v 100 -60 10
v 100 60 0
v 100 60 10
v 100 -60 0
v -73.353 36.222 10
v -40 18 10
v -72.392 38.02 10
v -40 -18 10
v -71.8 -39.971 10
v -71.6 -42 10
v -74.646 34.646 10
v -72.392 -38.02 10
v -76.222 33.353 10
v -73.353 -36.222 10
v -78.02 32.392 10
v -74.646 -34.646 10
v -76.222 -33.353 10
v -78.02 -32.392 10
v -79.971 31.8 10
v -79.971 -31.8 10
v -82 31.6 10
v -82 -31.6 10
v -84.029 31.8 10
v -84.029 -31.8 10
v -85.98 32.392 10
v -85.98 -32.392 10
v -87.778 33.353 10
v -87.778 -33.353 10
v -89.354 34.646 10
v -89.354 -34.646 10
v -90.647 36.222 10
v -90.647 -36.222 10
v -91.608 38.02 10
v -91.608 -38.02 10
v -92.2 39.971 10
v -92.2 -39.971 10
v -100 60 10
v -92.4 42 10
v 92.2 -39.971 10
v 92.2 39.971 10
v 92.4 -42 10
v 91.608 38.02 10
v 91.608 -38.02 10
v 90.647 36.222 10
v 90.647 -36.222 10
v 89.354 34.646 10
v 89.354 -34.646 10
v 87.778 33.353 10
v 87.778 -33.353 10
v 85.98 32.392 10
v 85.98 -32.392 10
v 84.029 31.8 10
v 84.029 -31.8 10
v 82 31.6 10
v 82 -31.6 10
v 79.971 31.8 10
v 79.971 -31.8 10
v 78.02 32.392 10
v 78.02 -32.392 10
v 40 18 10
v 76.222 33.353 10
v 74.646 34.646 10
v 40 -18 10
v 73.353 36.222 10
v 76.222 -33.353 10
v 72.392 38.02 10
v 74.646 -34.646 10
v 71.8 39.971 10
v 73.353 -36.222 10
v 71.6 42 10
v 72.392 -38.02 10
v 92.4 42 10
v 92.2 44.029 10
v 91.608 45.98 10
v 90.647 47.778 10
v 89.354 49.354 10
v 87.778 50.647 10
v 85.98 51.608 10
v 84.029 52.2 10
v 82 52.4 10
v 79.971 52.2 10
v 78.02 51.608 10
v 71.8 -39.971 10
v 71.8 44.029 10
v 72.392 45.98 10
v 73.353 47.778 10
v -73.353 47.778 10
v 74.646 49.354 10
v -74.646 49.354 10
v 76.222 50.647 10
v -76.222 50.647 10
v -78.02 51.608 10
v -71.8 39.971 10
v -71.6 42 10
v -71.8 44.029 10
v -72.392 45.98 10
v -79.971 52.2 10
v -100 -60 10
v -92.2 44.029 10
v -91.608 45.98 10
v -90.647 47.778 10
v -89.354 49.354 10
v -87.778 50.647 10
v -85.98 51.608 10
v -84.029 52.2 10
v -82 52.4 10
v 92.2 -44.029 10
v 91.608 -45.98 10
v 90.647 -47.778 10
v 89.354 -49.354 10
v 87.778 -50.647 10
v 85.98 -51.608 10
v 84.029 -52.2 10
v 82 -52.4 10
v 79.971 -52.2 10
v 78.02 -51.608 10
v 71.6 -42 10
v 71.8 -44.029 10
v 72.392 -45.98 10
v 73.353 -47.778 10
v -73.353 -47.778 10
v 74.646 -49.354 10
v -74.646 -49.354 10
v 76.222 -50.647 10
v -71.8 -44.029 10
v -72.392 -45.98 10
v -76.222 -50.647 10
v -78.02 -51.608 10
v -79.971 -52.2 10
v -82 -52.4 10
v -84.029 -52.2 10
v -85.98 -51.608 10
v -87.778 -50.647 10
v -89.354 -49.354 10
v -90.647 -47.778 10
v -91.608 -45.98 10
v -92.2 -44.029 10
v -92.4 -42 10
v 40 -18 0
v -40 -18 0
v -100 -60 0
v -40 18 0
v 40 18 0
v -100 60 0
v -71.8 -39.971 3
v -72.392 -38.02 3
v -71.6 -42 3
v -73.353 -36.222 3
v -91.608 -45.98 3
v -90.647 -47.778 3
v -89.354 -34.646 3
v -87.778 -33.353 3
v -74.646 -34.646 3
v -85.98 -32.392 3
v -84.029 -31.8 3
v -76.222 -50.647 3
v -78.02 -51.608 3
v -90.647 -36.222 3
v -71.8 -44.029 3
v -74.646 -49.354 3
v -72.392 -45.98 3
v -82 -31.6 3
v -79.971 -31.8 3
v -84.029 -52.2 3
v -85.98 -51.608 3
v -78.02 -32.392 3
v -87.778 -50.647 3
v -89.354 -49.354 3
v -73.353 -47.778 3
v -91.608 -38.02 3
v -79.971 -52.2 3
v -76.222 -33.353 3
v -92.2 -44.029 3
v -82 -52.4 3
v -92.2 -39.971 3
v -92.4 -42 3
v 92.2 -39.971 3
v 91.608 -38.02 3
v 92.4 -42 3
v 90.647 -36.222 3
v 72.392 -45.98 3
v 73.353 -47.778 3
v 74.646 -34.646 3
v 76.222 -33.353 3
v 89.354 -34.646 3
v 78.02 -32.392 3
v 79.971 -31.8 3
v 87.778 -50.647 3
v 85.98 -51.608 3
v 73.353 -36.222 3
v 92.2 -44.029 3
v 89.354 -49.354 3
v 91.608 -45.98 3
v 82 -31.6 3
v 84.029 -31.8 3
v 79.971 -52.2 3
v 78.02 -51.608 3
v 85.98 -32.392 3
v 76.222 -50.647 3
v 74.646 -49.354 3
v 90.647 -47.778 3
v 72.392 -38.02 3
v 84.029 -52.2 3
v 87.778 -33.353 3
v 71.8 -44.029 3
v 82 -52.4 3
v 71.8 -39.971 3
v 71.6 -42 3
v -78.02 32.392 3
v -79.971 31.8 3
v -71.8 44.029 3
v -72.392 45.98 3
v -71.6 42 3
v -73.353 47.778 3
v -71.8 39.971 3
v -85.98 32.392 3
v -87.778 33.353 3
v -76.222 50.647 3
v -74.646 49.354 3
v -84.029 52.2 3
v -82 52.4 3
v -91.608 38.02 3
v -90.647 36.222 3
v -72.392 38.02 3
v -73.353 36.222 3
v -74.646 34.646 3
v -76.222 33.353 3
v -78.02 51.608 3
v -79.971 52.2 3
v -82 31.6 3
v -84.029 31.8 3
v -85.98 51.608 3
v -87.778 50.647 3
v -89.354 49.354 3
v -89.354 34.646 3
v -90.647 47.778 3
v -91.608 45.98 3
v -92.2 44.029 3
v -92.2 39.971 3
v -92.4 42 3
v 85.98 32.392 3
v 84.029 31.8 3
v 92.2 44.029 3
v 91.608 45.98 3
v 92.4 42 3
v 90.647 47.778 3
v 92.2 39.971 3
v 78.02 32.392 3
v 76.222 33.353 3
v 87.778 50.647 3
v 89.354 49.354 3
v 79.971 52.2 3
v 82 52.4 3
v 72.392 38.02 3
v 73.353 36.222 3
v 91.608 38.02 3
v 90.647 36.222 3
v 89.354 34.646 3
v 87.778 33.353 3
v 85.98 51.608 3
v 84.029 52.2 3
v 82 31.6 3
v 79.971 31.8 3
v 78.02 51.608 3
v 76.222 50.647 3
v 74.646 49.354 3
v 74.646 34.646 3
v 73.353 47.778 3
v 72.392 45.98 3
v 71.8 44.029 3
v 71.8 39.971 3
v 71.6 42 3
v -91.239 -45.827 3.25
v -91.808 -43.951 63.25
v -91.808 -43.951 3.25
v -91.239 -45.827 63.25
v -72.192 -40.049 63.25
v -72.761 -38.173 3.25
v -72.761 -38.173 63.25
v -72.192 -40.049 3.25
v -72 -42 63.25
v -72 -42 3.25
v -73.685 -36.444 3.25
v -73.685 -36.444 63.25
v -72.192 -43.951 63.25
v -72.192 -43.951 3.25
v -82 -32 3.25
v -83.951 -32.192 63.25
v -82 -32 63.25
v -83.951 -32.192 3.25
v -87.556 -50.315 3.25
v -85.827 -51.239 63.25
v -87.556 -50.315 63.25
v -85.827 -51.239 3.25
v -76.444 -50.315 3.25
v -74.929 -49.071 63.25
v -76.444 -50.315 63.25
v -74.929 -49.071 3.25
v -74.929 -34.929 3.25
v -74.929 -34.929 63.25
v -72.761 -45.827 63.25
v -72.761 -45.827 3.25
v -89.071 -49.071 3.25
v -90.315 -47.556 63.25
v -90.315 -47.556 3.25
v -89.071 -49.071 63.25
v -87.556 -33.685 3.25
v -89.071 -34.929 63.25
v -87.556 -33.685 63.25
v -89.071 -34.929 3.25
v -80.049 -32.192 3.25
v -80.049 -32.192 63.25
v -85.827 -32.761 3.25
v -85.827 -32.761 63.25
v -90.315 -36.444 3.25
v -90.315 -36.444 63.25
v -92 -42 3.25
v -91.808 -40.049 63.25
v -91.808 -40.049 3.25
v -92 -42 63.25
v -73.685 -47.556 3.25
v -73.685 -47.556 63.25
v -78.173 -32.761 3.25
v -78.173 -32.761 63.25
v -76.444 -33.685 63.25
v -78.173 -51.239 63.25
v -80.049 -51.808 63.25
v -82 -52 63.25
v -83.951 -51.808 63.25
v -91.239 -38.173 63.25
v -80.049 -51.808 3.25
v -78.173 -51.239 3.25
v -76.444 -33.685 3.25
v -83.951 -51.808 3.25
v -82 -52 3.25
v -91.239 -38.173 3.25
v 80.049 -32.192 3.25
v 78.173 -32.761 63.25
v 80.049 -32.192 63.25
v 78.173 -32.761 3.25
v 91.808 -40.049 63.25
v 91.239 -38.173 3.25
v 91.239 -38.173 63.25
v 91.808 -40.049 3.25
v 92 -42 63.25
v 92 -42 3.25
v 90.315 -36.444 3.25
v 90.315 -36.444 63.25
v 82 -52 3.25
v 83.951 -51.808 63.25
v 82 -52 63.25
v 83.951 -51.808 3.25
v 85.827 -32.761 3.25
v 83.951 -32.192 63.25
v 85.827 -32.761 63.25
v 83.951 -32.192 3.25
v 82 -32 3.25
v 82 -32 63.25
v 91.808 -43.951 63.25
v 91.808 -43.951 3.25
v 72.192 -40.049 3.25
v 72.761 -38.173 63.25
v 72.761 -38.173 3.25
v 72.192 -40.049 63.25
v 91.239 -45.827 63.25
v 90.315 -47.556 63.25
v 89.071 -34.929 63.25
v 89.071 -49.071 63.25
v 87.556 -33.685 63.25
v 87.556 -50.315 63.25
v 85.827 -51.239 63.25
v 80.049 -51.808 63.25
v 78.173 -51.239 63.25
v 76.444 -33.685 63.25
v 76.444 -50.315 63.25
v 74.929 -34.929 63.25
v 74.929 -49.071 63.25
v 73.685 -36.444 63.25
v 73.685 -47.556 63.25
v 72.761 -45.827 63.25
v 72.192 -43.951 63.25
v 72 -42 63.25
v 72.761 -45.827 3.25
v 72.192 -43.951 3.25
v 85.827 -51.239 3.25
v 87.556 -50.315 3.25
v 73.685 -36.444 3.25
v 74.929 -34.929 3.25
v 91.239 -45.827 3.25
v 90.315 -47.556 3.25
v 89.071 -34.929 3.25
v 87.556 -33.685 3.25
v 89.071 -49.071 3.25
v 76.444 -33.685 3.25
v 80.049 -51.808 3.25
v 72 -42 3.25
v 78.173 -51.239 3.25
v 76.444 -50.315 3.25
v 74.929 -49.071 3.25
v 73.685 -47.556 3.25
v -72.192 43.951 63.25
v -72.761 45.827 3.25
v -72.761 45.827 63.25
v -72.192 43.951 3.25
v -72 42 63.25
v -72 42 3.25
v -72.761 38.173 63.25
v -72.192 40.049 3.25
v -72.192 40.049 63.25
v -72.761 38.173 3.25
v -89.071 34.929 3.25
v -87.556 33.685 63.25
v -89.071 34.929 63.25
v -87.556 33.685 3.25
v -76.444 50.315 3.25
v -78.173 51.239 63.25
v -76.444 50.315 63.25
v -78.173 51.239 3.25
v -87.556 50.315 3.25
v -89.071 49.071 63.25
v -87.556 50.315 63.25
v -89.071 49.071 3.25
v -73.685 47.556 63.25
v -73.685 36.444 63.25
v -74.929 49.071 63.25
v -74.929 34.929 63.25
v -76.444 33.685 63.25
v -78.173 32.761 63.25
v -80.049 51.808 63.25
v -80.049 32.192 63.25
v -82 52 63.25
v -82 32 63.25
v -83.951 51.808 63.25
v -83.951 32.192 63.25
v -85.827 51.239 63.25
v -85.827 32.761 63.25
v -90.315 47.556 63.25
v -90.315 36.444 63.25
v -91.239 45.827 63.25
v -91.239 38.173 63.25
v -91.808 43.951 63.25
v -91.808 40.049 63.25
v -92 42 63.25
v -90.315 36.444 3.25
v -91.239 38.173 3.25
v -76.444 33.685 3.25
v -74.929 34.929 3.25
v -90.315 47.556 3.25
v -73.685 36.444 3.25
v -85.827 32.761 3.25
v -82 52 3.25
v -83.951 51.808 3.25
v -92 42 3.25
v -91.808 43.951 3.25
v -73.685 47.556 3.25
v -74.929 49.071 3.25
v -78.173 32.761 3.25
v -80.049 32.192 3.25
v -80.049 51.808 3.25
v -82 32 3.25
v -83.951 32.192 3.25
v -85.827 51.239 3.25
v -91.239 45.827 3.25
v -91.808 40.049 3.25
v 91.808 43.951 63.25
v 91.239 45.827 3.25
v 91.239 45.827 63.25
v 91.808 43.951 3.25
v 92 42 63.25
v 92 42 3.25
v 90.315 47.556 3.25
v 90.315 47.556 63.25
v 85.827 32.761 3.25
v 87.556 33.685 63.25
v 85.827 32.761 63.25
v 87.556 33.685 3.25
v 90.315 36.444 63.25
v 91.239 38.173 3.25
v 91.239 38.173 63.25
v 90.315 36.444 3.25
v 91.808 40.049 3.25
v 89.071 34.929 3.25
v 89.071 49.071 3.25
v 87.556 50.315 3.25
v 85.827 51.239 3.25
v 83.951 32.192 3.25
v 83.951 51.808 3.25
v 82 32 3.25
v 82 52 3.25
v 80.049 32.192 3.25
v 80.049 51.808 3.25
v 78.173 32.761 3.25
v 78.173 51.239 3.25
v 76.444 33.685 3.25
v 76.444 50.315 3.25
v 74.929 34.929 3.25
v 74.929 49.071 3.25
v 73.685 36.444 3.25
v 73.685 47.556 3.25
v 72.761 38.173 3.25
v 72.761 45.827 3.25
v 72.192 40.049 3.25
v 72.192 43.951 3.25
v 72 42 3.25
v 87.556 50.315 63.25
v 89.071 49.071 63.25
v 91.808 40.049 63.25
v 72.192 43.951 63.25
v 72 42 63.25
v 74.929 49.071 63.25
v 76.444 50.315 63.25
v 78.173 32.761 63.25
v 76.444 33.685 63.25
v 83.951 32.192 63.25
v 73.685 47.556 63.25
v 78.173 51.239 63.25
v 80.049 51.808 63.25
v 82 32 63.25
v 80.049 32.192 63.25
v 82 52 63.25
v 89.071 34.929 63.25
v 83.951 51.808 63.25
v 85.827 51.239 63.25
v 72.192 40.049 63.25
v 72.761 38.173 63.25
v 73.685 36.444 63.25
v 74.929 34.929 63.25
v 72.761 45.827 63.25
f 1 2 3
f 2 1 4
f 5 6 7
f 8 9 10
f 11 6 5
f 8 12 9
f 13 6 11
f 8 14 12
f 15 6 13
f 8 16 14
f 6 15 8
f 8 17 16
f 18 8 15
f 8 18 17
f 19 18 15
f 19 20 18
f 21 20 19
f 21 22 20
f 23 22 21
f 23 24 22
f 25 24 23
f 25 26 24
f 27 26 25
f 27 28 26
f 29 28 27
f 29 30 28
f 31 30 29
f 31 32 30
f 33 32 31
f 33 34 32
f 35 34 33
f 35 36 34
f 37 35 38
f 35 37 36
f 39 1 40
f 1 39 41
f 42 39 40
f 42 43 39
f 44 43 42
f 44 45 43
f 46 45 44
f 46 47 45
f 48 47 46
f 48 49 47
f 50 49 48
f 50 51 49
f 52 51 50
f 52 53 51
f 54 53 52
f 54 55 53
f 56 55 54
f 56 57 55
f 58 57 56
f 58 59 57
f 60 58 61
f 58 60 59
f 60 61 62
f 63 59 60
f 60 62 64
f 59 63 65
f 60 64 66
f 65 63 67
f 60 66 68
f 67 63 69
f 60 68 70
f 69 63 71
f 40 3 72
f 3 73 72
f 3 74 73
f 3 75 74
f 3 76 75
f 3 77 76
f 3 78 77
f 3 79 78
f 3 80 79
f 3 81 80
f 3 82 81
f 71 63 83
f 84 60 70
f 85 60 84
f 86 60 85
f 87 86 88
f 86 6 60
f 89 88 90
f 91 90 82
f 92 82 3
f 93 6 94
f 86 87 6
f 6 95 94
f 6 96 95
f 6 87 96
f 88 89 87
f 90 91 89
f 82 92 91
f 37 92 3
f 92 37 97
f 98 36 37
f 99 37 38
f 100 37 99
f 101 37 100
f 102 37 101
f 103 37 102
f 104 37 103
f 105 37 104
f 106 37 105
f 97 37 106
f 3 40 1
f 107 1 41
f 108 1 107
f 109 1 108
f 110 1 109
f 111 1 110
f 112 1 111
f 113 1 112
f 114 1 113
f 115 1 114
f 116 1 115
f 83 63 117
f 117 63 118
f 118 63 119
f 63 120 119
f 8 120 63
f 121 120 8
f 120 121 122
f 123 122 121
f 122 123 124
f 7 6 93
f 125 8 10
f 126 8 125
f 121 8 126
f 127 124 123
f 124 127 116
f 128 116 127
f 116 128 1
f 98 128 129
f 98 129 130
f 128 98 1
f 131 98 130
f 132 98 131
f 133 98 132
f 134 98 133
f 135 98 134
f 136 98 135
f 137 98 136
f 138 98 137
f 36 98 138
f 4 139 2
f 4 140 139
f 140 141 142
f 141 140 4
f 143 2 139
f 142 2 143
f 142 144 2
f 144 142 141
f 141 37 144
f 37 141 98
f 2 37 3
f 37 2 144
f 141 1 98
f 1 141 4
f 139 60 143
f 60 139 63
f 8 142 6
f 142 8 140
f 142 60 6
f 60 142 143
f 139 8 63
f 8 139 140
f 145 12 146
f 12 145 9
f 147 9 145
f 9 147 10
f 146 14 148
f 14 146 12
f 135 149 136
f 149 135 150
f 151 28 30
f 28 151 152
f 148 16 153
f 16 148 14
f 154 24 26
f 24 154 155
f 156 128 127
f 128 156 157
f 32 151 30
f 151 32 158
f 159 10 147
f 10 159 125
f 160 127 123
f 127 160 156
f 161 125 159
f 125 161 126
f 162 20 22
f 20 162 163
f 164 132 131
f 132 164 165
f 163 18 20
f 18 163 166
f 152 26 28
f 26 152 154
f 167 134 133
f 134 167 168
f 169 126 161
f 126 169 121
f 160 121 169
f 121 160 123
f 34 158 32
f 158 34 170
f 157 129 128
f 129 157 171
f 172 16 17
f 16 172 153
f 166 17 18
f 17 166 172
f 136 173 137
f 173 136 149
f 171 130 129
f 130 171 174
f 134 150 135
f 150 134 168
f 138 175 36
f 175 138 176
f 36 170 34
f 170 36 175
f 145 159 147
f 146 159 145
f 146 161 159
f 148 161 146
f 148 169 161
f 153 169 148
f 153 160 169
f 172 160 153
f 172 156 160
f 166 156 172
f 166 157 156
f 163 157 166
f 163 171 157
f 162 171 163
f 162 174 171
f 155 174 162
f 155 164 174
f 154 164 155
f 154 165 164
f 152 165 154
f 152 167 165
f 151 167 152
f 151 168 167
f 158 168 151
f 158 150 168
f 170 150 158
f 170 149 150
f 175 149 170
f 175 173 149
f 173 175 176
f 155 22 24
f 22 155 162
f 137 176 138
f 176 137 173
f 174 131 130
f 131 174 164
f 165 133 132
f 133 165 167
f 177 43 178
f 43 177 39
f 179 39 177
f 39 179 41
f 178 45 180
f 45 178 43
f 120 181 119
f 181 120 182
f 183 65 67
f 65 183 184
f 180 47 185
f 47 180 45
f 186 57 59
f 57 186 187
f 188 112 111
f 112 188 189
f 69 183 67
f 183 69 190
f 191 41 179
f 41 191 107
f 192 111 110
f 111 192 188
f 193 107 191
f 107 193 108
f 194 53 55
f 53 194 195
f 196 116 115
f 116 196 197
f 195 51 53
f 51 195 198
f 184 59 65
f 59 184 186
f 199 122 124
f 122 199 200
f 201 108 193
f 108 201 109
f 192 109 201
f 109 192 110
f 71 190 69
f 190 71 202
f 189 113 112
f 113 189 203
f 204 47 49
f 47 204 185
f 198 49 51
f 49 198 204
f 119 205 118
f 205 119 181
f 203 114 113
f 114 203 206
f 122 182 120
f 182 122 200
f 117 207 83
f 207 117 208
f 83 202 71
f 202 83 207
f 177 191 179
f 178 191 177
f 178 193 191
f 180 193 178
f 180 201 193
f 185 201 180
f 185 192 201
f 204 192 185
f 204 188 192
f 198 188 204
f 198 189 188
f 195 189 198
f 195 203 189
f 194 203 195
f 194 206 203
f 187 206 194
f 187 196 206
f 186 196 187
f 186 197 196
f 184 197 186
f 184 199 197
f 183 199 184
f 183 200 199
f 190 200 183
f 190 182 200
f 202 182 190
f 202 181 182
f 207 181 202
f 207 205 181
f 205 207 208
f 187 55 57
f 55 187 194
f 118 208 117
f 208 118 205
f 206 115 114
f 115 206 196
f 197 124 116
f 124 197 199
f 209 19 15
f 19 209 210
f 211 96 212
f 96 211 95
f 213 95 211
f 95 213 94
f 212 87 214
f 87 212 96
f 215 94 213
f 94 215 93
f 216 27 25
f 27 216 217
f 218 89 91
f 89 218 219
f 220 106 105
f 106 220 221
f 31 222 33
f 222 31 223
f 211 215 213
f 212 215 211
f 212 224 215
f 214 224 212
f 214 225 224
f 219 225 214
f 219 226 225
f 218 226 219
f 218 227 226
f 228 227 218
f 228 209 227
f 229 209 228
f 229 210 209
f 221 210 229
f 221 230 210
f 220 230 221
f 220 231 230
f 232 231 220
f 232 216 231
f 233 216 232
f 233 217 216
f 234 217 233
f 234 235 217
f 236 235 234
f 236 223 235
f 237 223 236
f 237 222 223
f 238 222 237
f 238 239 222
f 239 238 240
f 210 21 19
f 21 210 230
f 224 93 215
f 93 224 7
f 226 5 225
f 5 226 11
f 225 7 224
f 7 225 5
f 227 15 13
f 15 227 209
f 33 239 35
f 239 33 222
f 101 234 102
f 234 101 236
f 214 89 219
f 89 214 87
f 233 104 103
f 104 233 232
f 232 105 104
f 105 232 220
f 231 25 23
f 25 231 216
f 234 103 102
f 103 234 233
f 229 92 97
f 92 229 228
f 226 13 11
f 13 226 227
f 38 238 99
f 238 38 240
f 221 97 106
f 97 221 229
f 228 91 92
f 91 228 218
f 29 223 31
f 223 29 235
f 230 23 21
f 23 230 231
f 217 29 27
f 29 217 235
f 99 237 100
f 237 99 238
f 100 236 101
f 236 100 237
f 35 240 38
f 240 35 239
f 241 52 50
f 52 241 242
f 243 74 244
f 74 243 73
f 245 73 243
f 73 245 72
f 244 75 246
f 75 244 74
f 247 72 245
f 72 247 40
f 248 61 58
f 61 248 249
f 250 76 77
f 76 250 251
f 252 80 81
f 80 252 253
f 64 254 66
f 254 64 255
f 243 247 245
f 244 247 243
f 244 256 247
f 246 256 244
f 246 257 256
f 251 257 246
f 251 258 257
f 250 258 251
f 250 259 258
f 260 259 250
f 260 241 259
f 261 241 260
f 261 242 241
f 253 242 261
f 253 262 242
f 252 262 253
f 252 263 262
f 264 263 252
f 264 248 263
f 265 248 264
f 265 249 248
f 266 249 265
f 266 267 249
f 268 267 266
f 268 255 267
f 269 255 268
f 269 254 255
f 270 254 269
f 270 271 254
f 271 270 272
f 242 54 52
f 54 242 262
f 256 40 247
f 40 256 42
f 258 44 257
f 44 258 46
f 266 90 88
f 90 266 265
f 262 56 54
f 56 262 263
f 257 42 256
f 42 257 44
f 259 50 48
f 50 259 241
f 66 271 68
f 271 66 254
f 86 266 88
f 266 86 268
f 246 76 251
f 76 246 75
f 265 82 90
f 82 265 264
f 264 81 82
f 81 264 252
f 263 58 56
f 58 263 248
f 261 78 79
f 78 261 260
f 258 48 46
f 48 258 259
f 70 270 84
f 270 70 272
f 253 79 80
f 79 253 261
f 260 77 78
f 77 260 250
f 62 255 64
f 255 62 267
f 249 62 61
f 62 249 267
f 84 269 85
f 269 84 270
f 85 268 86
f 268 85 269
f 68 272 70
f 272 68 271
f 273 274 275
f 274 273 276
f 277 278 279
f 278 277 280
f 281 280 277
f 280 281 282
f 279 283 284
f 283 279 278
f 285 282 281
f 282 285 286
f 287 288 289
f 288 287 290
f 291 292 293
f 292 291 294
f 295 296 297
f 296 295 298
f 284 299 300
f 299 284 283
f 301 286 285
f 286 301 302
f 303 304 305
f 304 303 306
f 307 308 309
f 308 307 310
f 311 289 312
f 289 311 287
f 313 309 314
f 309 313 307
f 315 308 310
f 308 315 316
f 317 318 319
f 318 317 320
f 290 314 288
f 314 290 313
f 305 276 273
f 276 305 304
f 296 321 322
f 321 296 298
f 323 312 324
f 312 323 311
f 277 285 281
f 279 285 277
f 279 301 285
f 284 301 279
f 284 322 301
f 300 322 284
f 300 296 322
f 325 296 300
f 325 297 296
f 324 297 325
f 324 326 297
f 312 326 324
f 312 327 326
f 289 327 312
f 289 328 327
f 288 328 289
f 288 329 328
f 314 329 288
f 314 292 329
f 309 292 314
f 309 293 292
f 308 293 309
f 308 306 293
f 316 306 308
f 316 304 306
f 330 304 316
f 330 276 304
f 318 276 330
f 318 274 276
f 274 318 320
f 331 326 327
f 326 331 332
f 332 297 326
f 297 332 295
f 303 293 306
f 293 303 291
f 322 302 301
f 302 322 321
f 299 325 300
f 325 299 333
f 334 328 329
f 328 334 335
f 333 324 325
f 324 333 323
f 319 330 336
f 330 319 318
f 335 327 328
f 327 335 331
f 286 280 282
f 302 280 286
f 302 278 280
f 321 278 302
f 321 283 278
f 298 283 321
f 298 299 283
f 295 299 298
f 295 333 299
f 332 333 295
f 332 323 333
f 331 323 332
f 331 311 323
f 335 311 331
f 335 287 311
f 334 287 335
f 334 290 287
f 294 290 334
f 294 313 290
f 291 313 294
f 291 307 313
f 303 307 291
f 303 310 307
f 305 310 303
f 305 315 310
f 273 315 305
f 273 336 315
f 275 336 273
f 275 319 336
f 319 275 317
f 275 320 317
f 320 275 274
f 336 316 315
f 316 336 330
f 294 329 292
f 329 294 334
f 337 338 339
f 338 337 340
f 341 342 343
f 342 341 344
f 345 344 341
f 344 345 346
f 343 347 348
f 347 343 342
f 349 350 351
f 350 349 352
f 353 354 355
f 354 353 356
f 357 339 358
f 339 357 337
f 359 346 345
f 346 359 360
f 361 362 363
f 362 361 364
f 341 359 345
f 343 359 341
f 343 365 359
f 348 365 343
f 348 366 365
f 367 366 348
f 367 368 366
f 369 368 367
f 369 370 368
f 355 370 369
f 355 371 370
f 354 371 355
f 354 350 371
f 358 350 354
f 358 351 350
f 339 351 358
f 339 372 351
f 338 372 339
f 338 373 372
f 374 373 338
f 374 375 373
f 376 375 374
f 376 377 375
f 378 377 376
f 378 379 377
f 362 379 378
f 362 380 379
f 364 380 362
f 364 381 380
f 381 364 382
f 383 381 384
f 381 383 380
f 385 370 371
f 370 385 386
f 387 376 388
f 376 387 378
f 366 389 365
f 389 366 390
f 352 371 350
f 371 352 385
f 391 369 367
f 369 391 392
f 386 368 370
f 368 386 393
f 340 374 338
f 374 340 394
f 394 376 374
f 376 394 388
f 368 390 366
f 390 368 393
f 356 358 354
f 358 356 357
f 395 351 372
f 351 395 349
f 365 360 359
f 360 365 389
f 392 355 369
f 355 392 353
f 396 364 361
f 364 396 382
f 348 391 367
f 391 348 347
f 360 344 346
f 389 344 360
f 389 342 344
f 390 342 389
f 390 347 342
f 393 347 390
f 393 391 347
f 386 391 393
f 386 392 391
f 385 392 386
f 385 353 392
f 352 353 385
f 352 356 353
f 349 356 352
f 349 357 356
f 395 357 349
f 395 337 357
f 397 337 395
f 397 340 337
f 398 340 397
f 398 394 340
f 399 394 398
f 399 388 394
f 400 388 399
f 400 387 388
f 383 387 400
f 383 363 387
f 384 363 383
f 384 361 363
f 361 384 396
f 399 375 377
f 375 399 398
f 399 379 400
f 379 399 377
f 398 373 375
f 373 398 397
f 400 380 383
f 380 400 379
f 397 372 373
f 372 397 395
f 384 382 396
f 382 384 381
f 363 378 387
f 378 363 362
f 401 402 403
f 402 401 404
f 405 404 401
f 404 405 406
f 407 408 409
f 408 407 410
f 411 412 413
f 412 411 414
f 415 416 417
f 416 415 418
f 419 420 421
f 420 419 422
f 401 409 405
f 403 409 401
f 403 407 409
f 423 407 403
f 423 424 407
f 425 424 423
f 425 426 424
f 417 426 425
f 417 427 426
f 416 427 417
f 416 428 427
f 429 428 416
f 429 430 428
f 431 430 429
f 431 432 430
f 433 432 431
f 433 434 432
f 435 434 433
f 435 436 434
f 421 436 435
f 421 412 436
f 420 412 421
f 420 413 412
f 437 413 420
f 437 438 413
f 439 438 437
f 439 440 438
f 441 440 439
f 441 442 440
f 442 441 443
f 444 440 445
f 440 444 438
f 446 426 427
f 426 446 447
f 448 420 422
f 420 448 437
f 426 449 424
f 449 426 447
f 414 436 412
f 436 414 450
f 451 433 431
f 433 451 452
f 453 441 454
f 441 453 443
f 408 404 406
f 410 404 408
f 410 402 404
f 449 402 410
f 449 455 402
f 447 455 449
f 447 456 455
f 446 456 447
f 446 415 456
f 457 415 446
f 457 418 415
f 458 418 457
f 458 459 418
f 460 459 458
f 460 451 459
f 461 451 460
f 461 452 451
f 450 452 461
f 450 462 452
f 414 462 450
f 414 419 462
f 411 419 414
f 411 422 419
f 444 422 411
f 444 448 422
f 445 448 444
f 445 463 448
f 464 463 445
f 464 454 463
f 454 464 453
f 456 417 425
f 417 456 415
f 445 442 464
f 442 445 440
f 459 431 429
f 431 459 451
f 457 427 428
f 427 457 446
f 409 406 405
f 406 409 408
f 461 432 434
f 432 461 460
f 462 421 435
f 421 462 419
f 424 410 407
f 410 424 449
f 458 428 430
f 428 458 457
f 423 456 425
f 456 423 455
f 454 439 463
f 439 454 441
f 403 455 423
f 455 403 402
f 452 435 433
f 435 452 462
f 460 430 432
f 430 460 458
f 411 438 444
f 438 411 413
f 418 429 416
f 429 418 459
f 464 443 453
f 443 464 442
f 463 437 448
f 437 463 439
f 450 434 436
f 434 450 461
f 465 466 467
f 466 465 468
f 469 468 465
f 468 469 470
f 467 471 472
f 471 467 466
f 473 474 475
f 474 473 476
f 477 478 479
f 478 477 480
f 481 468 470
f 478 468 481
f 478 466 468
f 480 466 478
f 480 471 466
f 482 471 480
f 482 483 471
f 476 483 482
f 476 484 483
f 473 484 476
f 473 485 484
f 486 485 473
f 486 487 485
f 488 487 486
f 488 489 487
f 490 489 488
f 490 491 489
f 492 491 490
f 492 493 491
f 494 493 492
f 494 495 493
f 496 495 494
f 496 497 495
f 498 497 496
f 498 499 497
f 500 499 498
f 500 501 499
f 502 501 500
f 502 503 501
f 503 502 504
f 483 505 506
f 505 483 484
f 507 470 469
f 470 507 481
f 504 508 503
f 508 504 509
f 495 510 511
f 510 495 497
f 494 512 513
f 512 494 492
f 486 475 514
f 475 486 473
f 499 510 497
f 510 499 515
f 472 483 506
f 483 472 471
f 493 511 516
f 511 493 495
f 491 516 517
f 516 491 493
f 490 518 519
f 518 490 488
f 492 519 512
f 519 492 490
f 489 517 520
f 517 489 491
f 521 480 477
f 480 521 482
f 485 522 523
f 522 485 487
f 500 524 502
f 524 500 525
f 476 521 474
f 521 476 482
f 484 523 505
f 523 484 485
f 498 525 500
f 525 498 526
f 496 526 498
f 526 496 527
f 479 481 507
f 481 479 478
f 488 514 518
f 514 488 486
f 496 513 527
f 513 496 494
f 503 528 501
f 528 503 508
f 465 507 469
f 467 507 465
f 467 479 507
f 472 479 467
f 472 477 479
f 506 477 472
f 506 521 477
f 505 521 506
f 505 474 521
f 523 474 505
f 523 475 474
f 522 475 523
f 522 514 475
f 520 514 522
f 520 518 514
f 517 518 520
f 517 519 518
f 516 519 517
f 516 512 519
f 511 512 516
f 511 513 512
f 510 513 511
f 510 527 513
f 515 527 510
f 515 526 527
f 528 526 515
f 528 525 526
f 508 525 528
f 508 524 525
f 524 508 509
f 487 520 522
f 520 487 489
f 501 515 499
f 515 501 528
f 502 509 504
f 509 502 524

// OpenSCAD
$fn = 32;

// ------------------------------------------------------------------------
// Frame with four posts: 200 x 120 mm frame, four d20 posts
// Every part is its own module, assembly() places them once.
// ------------------------------------------------------------------------

// --- part 1 ---
module base_frame() {
  difference() {
    translate([-100, -60, 0]) cube([200, 120, 10]);
    translate([-40, -18, -1]) cube([80, 36, 12]);
    translate([-82, -42, 3]) cylinder(h = 8, d = 20.8);
    translate([82, -42, 3]) cylinder(h = 8, d = 20.8);
    translate([-82, 42, 3]) cylinder(h = 8, d = 20.8);
    translate([82, 42, 3]) cylinder(h = 8, d = 20.8);
  }
}

// --- part 2 ---
module post1() {
  cylinder(h = 60, d = 20);
}

// --- part 3 ---
module post2() {
  cylinder(h = 60, d = 20);
}

// --- part 4 ---
module post3() {
  cylinder(h = 60, d = 20);
}

// --- part 5 ---
module post4() {
  cylinder(h = 60, d = 20);
}

// --- assembly ---
module assembly() {
  translate([0, 0, 0]) rotate([0, 0, 0]) base_frame();
  translate([-82, -42, 3.25]) rotate([0, 0, 0]) post1();
  translate([82, -42, 3.25]) rotate([0, 0, 0]) post2();
  translate([-82, 42, 3.25]) rotate([0, 0, 0]) post3();
  translate([82, 42, 3.25]) rotate([0, 0, 0]) post4();
}

assembly();
